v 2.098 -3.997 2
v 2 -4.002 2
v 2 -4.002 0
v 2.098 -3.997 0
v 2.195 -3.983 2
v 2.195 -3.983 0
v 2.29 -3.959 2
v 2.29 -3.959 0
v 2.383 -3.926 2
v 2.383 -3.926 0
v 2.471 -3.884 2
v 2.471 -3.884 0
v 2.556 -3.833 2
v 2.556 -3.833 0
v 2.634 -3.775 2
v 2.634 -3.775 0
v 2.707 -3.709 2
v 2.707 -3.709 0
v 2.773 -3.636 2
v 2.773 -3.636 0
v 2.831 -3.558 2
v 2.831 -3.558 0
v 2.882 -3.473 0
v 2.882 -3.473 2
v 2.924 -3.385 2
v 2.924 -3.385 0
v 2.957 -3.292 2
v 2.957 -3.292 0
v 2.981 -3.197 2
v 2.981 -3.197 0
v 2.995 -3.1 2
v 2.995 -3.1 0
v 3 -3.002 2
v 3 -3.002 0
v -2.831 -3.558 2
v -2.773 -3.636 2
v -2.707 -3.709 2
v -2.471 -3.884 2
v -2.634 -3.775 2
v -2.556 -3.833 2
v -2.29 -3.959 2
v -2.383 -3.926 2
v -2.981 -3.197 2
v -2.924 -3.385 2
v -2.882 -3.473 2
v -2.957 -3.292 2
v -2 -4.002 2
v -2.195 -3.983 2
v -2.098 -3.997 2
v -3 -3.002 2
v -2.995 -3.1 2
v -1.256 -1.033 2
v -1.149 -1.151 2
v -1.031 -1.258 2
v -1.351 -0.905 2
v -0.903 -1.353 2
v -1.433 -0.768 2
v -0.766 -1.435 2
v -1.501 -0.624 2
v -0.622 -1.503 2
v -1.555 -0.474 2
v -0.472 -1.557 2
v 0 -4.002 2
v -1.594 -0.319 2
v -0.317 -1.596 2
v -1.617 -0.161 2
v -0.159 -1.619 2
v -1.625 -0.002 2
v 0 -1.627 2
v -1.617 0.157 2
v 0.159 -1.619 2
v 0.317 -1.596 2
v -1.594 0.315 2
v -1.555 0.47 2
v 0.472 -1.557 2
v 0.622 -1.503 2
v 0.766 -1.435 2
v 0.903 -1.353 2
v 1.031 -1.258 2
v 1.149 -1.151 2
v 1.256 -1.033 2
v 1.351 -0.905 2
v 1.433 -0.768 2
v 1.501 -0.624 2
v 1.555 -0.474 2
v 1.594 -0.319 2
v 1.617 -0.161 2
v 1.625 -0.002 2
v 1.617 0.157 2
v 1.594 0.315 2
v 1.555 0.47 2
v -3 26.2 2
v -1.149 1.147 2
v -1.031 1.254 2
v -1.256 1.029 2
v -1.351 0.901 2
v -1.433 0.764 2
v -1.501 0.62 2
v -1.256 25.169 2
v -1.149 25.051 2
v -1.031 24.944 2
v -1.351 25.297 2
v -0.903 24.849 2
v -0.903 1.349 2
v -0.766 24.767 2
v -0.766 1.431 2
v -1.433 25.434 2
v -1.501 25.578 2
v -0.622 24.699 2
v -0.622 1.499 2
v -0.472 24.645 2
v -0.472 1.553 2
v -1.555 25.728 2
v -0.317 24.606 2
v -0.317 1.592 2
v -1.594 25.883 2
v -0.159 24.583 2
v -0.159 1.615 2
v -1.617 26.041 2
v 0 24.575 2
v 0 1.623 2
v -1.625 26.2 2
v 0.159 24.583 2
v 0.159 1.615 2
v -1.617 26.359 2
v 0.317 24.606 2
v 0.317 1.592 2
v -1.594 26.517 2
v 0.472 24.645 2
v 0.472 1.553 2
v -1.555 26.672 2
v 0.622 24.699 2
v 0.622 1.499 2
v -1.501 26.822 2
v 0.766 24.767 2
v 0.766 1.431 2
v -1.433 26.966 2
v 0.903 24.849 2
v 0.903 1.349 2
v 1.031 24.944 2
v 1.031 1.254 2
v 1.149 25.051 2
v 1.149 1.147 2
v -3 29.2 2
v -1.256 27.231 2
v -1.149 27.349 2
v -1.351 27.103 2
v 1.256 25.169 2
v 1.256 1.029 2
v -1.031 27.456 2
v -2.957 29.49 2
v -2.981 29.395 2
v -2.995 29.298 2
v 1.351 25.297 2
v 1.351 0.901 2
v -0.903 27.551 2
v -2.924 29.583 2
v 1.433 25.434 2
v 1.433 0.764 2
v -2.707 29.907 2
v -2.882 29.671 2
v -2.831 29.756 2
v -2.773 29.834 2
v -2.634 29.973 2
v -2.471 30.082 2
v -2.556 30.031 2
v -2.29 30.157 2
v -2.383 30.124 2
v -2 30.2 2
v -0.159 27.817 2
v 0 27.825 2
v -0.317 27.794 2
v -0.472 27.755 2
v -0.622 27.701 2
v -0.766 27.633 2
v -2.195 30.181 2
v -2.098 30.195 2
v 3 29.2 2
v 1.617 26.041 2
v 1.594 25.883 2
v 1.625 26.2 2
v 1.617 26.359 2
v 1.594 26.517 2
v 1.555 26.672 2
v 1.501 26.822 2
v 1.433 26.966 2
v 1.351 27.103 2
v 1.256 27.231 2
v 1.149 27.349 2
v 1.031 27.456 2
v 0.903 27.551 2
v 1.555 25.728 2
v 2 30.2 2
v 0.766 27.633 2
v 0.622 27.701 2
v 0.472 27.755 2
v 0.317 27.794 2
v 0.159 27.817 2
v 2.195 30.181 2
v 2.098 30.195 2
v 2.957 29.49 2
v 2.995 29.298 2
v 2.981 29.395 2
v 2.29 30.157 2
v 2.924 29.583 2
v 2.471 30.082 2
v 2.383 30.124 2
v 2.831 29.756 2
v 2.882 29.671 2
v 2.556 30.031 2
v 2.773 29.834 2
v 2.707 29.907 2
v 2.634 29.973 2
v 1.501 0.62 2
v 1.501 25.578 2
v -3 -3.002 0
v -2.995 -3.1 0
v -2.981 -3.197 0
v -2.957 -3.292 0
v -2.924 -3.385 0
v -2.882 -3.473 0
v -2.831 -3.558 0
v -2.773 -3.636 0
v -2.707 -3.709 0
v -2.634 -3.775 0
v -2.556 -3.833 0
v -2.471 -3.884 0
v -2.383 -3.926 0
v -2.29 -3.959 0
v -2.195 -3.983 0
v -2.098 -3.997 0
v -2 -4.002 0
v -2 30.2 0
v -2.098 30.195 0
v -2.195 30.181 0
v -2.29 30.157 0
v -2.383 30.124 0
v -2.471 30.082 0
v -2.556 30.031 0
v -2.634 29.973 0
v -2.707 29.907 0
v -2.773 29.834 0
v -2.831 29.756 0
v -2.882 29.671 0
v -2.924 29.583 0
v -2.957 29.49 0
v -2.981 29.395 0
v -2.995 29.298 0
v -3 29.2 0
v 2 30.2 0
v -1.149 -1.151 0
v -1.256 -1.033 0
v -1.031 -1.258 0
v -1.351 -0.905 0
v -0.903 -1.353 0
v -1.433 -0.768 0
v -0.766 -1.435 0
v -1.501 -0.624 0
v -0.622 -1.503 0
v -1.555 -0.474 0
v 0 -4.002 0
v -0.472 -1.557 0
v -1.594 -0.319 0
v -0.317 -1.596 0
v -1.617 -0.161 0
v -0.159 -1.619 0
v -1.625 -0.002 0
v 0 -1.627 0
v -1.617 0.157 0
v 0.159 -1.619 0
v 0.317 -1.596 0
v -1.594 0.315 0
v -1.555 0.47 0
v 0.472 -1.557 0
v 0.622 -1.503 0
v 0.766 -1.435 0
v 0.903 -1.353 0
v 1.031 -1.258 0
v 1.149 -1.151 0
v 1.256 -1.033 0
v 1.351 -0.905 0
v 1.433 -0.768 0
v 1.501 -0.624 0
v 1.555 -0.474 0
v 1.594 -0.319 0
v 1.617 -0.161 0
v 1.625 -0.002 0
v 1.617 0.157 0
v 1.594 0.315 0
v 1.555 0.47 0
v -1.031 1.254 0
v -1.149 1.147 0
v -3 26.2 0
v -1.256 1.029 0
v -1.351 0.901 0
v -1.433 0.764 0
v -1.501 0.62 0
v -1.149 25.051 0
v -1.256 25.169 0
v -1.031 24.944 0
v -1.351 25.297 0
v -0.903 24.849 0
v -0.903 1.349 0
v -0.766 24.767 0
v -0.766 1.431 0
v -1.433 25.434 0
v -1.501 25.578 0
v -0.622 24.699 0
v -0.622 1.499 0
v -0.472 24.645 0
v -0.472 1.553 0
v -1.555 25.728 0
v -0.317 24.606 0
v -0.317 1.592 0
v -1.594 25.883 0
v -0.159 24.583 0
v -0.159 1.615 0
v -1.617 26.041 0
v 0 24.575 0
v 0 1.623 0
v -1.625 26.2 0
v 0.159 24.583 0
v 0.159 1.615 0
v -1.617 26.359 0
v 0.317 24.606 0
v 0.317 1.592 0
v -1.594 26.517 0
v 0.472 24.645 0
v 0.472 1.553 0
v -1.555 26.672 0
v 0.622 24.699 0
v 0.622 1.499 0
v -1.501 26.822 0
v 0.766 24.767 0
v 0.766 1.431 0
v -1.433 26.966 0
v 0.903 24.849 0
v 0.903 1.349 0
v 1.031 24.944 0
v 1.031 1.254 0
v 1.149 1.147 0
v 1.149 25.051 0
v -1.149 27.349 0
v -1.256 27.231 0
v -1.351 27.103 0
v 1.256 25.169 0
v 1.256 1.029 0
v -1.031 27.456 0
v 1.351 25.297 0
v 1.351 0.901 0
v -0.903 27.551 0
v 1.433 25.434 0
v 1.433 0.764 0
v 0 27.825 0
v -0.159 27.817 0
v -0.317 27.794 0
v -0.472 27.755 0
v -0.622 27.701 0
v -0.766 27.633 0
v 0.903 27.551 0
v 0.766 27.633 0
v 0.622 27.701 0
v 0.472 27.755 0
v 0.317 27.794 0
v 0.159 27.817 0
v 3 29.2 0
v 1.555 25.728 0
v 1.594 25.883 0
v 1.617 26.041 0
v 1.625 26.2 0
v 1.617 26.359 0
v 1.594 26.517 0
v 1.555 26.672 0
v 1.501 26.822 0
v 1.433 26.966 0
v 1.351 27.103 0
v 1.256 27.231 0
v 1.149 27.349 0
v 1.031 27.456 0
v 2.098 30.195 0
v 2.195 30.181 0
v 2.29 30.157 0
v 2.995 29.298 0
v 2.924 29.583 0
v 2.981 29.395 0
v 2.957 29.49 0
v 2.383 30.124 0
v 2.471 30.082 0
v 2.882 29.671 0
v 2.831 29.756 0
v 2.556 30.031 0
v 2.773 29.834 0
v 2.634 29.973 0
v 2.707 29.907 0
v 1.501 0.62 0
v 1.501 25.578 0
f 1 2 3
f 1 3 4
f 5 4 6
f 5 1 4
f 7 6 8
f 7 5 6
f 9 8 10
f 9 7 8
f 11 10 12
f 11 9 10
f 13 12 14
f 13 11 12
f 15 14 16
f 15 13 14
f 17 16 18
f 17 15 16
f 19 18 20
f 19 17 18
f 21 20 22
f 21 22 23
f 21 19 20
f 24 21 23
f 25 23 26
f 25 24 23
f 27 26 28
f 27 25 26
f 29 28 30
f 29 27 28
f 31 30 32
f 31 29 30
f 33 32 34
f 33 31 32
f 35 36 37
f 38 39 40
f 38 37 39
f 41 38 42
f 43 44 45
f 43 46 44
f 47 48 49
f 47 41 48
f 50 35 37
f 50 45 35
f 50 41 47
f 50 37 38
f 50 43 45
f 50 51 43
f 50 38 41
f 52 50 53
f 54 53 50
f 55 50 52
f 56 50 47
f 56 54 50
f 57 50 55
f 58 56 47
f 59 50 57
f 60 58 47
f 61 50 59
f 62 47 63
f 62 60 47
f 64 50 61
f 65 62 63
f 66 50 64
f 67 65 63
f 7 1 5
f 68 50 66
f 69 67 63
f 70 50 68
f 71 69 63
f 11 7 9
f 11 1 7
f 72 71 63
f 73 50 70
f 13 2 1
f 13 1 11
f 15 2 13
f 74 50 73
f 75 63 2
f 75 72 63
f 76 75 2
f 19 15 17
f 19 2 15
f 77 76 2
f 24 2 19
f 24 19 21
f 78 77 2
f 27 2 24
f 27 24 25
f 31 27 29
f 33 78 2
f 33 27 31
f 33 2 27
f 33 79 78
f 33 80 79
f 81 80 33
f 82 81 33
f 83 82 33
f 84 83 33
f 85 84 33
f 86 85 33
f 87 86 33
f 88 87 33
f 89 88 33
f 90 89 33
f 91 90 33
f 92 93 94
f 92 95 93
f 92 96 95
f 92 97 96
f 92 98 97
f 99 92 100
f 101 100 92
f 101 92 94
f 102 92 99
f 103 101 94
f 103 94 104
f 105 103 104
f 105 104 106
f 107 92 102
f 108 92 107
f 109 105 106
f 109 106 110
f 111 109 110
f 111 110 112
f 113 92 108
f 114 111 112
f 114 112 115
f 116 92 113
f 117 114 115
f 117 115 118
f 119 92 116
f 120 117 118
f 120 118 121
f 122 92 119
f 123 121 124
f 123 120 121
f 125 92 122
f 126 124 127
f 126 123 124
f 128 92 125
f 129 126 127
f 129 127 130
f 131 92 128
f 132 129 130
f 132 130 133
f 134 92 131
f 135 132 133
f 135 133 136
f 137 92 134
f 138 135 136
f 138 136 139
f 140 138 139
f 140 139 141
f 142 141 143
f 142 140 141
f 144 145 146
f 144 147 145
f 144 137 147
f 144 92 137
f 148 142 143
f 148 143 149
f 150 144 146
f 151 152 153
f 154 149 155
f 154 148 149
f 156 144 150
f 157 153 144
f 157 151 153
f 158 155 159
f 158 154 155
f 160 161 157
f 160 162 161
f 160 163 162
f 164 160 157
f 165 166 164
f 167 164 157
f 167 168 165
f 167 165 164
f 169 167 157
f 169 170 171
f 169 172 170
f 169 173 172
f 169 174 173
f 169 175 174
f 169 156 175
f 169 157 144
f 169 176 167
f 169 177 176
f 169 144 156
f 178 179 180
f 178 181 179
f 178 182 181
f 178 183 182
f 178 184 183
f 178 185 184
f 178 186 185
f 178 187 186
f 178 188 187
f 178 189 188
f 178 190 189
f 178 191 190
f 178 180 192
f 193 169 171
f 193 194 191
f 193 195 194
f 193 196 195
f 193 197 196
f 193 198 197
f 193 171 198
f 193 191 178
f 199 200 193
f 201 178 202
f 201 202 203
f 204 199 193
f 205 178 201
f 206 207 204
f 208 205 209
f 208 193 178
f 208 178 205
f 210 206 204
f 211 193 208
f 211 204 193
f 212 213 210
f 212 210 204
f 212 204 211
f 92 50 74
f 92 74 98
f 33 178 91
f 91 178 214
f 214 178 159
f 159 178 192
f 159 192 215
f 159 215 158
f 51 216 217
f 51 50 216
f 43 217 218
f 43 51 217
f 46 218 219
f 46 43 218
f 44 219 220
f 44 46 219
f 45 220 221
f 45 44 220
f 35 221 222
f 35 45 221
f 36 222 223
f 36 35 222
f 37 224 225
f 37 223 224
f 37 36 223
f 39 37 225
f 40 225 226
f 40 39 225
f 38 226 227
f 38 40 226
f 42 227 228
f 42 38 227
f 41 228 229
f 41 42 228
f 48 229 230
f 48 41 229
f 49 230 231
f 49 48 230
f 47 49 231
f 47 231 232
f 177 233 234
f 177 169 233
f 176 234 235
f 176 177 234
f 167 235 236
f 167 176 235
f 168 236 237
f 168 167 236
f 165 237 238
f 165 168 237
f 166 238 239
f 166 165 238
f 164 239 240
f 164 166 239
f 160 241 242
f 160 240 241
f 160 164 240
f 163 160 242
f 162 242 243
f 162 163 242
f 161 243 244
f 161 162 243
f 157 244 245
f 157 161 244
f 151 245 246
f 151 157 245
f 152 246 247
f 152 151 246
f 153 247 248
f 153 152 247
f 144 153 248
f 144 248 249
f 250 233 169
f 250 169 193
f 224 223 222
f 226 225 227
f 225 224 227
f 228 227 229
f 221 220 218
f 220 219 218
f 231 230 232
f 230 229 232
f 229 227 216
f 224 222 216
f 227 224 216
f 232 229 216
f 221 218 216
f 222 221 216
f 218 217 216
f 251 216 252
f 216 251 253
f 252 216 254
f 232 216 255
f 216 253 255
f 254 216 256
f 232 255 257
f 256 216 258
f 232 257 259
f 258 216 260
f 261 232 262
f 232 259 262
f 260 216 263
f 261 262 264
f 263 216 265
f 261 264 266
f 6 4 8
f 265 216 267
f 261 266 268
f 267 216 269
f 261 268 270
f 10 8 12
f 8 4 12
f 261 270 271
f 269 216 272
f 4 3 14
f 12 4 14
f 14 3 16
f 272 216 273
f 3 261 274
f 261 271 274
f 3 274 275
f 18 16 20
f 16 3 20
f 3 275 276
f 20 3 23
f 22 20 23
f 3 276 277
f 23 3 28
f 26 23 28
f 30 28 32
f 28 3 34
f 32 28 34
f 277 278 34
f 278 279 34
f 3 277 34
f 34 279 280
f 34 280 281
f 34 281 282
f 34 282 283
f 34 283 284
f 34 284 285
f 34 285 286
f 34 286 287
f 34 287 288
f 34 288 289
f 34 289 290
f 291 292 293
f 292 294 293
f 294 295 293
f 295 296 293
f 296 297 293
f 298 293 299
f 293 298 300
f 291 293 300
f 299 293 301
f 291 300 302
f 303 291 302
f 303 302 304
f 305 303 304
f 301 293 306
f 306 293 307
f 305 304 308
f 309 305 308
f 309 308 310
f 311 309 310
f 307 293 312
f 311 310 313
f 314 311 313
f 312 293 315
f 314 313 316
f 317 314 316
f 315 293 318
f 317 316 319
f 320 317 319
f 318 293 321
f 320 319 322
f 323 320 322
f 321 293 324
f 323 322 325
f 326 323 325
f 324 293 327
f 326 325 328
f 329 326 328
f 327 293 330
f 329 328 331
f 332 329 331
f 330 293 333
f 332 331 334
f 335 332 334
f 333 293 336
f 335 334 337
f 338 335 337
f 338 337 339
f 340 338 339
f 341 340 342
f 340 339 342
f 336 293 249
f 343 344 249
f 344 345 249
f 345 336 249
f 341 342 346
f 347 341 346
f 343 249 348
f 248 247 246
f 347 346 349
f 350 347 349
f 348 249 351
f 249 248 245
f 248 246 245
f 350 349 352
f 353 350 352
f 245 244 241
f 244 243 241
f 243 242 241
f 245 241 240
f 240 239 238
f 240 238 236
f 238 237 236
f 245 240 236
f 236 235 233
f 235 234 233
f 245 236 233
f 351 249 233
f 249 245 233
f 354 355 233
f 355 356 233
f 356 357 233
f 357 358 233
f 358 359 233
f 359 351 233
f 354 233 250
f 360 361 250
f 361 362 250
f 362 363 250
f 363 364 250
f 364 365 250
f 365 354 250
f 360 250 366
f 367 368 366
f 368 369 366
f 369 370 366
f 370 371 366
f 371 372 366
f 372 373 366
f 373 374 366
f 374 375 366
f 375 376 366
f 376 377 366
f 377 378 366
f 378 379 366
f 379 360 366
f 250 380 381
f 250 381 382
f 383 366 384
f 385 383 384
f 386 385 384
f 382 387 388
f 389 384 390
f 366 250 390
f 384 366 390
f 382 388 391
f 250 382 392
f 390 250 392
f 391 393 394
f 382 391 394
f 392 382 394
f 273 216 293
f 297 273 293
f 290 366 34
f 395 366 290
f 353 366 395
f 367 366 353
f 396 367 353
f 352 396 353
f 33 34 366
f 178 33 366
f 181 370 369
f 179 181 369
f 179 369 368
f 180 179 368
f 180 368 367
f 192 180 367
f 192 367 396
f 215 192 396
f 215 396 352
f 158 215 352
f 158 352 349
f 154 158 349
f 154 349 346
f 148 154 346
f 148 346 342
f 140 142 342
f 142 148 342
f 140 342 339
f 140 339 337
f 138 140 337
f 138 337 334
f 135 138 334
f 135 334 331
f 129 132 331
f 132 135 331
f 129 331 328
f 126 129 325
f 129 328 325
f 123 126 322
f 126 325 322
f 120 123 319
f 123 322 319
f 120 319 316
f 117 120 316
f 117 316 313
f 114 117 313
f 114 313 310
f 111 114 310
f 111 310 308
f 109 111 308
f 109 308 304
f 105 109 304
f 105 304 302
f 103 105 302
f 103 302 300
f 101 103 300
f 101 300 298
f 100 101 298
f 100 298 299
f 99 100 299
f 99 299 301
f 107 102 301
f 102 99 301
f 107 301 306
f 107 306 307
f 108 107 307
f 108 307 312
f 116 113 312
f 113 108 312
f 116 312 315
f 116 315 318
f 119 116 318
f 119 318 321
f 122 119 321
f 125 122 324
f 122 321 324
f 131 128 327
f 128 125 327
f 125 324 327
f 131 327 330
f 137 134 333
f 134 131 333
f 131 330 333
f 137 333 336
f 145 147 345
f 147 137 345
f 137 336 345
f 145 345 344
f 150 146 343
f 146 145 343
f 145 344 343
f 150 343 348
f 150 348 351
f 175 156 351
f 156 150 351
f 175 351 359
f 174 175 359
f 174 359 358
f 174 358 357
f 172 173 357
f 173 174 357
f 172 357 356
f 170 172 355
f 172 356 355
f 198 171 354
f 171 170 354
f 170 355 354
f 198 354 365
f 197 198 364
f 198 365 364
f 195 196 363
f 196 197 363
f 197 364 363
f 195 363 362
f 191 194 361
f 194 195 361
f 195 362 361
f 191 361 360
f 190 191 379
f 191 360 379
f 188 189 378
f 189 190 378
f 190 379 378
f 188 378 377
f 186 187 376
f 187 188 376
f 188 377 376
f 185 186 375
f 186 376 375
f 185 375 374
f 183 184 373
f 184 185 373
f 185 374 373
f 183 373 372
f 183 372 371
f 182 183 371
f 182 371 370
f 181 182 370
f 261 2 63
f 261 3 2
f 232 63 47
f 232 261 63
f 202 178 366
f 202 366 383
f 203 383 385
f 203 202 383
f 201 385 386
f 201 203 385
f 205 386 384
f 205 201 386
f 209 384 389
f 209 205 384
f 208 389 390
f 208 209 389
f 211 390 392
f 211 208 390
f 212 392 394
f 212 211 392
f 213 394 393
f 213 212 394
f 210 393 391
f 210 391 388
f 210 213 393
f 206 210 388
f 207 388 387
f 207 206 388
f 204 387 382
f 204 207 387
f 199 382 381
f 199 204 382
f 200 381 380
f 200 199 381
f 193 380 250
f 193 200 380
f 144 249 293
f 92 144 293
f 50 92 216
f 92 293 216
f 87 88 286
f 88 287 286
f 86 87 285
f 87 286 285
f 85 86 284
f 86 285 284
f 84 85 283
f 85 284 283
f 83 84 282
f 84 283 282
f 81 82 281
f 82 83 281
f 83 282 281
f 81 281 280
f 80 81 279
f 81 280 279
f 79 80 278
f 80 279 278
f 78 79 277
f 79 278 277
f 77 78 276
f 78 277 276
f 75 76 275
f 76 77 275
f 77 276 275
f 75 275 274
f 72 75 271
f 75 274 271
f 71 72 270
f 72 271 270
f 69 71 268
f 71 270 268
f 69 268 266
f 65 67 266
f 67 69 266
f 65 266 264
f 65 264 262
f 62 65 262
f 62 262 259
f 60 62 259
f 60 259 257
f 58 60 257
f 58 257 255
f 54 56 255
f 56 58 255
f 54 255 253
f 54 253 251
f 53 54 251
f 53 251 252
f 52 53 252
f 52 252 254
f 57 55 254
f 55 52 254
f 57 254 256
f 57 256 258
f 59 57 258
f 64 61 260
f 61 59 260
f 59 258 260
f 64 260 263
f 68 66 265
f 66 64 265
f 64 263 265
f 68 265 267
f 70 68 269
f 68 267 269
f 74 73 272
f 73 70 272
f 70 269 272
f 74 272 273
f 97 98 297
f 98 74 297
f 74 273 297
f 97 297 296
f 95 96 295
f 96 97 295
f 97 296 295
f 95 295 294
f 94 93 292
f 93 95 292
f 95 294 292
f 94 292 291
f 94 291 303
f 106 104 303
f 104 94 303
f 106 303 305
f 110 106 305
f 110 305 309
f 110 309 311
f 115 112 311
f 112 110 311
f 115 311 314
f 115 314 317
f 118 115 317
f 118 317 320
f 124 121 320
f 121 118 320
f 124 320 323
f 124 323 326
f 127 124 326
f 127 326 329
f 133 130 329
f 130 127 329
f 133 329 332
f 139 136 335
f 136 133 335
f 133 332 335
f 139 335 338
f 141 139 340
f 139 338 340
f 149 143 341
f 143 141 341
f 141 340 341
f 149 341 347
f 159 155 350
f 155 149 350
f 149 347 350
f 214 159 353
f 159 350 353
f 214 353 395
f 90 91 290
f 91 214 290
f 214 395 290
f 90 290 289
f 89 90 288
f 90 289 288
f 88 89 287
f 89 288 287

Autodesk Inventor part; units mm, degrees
ref_plane "YZ Plane" through (0, 0, 0) normal (1, 0, 0) x (0, 1, 0)
ref_plane "XZ Plane" through (0, 0, 0) normal (0, 1, 0) x (-1, 0, 0)
ref_plane "XY Plane" through (0, 0, 0) normal (0, 0, 1) x (1, 0, 0)
sketch "Sketch1" plane through (0, 0, 0) normal (0, 0, 1) x (1, 0, 0)
  circle A0 centre (0, -0.002) radius 1.375 projected
  circle A1 centre (-0.0001, 26.2) radius 1.5 projected
  line L0 (0, -0.002) -> (0, -4.002)
  line L1 (0, -4.002) -> (-3, -4.002)
  line L2 (-0.0001, 26.2) -> (-3, 26.2)
  line L3 (-3, 26.2) -> (-3, 30.2)
  line L4 (-3, 30.2) -> (3, 30.2)
  line L5 (-3, -4.002) -> (3, -4.002)
  line L6 (3, -4.002) -> (3, 30.2)
  line L7 (3, 30.2) -> (-3, 30.2)
  line L8 (-3, 30.2) -> (-3, -4.002)
  circle A2 centre (0, -0.002) radius 1.625
  circle A3 centre (42.1135, 26.2) radius 1.5 projected
  circle A4 centre (-0.0001, 26.2) radius 1.5 projected
  line L9 (-6.8272, 34.4) -> (15.5728, 34.4) projected
  line L10 (-6.8272, 17) -> (-6.8272, 34.4) projected
  line L11 (48.6728, 17) -> (-6.8272, 17) projected
  line L12 (48.6728, 34.4) -> (48.6728, 17) projected
  line L13 (26.2804, 34.4) -> (48.6728, 34.4) projected
  line L14 (26.2804, 47.56) -> (26.2804, 34.4) projected
  line L15 (15.5728, 47.56) -> (26.2804, 47.56) projected
  line L16 (15.5728, 34.4) -> (15.5728, 47.56) projected
  circle A5 centre (20.9266, 44.75) radius 1.75 projected
  circle A6 centre (-0.0001, 26.2) radius 1.625
  point P0 (0, 0)
  dimension "d0" = 4
  dimension "d1" = 3
  dimension "d2" = 4
  dimension "d3" = 6
  dimension "d4" = 3.25
  dimension "d5" = 3.25
extrude "Extrusion1" add sketch "Sketch1" along normal blind 2 contours L1 L8 L11 L6 L5 | L8 L3 L4 L6 L11
fillet "Fillet1" radius 1 4 edges at (-3, -4.002, 1) (3, -4.002, 1) (3, 30.2, 1) (-3, 30.2, 1)
properties part number "SyringeBarTail"
